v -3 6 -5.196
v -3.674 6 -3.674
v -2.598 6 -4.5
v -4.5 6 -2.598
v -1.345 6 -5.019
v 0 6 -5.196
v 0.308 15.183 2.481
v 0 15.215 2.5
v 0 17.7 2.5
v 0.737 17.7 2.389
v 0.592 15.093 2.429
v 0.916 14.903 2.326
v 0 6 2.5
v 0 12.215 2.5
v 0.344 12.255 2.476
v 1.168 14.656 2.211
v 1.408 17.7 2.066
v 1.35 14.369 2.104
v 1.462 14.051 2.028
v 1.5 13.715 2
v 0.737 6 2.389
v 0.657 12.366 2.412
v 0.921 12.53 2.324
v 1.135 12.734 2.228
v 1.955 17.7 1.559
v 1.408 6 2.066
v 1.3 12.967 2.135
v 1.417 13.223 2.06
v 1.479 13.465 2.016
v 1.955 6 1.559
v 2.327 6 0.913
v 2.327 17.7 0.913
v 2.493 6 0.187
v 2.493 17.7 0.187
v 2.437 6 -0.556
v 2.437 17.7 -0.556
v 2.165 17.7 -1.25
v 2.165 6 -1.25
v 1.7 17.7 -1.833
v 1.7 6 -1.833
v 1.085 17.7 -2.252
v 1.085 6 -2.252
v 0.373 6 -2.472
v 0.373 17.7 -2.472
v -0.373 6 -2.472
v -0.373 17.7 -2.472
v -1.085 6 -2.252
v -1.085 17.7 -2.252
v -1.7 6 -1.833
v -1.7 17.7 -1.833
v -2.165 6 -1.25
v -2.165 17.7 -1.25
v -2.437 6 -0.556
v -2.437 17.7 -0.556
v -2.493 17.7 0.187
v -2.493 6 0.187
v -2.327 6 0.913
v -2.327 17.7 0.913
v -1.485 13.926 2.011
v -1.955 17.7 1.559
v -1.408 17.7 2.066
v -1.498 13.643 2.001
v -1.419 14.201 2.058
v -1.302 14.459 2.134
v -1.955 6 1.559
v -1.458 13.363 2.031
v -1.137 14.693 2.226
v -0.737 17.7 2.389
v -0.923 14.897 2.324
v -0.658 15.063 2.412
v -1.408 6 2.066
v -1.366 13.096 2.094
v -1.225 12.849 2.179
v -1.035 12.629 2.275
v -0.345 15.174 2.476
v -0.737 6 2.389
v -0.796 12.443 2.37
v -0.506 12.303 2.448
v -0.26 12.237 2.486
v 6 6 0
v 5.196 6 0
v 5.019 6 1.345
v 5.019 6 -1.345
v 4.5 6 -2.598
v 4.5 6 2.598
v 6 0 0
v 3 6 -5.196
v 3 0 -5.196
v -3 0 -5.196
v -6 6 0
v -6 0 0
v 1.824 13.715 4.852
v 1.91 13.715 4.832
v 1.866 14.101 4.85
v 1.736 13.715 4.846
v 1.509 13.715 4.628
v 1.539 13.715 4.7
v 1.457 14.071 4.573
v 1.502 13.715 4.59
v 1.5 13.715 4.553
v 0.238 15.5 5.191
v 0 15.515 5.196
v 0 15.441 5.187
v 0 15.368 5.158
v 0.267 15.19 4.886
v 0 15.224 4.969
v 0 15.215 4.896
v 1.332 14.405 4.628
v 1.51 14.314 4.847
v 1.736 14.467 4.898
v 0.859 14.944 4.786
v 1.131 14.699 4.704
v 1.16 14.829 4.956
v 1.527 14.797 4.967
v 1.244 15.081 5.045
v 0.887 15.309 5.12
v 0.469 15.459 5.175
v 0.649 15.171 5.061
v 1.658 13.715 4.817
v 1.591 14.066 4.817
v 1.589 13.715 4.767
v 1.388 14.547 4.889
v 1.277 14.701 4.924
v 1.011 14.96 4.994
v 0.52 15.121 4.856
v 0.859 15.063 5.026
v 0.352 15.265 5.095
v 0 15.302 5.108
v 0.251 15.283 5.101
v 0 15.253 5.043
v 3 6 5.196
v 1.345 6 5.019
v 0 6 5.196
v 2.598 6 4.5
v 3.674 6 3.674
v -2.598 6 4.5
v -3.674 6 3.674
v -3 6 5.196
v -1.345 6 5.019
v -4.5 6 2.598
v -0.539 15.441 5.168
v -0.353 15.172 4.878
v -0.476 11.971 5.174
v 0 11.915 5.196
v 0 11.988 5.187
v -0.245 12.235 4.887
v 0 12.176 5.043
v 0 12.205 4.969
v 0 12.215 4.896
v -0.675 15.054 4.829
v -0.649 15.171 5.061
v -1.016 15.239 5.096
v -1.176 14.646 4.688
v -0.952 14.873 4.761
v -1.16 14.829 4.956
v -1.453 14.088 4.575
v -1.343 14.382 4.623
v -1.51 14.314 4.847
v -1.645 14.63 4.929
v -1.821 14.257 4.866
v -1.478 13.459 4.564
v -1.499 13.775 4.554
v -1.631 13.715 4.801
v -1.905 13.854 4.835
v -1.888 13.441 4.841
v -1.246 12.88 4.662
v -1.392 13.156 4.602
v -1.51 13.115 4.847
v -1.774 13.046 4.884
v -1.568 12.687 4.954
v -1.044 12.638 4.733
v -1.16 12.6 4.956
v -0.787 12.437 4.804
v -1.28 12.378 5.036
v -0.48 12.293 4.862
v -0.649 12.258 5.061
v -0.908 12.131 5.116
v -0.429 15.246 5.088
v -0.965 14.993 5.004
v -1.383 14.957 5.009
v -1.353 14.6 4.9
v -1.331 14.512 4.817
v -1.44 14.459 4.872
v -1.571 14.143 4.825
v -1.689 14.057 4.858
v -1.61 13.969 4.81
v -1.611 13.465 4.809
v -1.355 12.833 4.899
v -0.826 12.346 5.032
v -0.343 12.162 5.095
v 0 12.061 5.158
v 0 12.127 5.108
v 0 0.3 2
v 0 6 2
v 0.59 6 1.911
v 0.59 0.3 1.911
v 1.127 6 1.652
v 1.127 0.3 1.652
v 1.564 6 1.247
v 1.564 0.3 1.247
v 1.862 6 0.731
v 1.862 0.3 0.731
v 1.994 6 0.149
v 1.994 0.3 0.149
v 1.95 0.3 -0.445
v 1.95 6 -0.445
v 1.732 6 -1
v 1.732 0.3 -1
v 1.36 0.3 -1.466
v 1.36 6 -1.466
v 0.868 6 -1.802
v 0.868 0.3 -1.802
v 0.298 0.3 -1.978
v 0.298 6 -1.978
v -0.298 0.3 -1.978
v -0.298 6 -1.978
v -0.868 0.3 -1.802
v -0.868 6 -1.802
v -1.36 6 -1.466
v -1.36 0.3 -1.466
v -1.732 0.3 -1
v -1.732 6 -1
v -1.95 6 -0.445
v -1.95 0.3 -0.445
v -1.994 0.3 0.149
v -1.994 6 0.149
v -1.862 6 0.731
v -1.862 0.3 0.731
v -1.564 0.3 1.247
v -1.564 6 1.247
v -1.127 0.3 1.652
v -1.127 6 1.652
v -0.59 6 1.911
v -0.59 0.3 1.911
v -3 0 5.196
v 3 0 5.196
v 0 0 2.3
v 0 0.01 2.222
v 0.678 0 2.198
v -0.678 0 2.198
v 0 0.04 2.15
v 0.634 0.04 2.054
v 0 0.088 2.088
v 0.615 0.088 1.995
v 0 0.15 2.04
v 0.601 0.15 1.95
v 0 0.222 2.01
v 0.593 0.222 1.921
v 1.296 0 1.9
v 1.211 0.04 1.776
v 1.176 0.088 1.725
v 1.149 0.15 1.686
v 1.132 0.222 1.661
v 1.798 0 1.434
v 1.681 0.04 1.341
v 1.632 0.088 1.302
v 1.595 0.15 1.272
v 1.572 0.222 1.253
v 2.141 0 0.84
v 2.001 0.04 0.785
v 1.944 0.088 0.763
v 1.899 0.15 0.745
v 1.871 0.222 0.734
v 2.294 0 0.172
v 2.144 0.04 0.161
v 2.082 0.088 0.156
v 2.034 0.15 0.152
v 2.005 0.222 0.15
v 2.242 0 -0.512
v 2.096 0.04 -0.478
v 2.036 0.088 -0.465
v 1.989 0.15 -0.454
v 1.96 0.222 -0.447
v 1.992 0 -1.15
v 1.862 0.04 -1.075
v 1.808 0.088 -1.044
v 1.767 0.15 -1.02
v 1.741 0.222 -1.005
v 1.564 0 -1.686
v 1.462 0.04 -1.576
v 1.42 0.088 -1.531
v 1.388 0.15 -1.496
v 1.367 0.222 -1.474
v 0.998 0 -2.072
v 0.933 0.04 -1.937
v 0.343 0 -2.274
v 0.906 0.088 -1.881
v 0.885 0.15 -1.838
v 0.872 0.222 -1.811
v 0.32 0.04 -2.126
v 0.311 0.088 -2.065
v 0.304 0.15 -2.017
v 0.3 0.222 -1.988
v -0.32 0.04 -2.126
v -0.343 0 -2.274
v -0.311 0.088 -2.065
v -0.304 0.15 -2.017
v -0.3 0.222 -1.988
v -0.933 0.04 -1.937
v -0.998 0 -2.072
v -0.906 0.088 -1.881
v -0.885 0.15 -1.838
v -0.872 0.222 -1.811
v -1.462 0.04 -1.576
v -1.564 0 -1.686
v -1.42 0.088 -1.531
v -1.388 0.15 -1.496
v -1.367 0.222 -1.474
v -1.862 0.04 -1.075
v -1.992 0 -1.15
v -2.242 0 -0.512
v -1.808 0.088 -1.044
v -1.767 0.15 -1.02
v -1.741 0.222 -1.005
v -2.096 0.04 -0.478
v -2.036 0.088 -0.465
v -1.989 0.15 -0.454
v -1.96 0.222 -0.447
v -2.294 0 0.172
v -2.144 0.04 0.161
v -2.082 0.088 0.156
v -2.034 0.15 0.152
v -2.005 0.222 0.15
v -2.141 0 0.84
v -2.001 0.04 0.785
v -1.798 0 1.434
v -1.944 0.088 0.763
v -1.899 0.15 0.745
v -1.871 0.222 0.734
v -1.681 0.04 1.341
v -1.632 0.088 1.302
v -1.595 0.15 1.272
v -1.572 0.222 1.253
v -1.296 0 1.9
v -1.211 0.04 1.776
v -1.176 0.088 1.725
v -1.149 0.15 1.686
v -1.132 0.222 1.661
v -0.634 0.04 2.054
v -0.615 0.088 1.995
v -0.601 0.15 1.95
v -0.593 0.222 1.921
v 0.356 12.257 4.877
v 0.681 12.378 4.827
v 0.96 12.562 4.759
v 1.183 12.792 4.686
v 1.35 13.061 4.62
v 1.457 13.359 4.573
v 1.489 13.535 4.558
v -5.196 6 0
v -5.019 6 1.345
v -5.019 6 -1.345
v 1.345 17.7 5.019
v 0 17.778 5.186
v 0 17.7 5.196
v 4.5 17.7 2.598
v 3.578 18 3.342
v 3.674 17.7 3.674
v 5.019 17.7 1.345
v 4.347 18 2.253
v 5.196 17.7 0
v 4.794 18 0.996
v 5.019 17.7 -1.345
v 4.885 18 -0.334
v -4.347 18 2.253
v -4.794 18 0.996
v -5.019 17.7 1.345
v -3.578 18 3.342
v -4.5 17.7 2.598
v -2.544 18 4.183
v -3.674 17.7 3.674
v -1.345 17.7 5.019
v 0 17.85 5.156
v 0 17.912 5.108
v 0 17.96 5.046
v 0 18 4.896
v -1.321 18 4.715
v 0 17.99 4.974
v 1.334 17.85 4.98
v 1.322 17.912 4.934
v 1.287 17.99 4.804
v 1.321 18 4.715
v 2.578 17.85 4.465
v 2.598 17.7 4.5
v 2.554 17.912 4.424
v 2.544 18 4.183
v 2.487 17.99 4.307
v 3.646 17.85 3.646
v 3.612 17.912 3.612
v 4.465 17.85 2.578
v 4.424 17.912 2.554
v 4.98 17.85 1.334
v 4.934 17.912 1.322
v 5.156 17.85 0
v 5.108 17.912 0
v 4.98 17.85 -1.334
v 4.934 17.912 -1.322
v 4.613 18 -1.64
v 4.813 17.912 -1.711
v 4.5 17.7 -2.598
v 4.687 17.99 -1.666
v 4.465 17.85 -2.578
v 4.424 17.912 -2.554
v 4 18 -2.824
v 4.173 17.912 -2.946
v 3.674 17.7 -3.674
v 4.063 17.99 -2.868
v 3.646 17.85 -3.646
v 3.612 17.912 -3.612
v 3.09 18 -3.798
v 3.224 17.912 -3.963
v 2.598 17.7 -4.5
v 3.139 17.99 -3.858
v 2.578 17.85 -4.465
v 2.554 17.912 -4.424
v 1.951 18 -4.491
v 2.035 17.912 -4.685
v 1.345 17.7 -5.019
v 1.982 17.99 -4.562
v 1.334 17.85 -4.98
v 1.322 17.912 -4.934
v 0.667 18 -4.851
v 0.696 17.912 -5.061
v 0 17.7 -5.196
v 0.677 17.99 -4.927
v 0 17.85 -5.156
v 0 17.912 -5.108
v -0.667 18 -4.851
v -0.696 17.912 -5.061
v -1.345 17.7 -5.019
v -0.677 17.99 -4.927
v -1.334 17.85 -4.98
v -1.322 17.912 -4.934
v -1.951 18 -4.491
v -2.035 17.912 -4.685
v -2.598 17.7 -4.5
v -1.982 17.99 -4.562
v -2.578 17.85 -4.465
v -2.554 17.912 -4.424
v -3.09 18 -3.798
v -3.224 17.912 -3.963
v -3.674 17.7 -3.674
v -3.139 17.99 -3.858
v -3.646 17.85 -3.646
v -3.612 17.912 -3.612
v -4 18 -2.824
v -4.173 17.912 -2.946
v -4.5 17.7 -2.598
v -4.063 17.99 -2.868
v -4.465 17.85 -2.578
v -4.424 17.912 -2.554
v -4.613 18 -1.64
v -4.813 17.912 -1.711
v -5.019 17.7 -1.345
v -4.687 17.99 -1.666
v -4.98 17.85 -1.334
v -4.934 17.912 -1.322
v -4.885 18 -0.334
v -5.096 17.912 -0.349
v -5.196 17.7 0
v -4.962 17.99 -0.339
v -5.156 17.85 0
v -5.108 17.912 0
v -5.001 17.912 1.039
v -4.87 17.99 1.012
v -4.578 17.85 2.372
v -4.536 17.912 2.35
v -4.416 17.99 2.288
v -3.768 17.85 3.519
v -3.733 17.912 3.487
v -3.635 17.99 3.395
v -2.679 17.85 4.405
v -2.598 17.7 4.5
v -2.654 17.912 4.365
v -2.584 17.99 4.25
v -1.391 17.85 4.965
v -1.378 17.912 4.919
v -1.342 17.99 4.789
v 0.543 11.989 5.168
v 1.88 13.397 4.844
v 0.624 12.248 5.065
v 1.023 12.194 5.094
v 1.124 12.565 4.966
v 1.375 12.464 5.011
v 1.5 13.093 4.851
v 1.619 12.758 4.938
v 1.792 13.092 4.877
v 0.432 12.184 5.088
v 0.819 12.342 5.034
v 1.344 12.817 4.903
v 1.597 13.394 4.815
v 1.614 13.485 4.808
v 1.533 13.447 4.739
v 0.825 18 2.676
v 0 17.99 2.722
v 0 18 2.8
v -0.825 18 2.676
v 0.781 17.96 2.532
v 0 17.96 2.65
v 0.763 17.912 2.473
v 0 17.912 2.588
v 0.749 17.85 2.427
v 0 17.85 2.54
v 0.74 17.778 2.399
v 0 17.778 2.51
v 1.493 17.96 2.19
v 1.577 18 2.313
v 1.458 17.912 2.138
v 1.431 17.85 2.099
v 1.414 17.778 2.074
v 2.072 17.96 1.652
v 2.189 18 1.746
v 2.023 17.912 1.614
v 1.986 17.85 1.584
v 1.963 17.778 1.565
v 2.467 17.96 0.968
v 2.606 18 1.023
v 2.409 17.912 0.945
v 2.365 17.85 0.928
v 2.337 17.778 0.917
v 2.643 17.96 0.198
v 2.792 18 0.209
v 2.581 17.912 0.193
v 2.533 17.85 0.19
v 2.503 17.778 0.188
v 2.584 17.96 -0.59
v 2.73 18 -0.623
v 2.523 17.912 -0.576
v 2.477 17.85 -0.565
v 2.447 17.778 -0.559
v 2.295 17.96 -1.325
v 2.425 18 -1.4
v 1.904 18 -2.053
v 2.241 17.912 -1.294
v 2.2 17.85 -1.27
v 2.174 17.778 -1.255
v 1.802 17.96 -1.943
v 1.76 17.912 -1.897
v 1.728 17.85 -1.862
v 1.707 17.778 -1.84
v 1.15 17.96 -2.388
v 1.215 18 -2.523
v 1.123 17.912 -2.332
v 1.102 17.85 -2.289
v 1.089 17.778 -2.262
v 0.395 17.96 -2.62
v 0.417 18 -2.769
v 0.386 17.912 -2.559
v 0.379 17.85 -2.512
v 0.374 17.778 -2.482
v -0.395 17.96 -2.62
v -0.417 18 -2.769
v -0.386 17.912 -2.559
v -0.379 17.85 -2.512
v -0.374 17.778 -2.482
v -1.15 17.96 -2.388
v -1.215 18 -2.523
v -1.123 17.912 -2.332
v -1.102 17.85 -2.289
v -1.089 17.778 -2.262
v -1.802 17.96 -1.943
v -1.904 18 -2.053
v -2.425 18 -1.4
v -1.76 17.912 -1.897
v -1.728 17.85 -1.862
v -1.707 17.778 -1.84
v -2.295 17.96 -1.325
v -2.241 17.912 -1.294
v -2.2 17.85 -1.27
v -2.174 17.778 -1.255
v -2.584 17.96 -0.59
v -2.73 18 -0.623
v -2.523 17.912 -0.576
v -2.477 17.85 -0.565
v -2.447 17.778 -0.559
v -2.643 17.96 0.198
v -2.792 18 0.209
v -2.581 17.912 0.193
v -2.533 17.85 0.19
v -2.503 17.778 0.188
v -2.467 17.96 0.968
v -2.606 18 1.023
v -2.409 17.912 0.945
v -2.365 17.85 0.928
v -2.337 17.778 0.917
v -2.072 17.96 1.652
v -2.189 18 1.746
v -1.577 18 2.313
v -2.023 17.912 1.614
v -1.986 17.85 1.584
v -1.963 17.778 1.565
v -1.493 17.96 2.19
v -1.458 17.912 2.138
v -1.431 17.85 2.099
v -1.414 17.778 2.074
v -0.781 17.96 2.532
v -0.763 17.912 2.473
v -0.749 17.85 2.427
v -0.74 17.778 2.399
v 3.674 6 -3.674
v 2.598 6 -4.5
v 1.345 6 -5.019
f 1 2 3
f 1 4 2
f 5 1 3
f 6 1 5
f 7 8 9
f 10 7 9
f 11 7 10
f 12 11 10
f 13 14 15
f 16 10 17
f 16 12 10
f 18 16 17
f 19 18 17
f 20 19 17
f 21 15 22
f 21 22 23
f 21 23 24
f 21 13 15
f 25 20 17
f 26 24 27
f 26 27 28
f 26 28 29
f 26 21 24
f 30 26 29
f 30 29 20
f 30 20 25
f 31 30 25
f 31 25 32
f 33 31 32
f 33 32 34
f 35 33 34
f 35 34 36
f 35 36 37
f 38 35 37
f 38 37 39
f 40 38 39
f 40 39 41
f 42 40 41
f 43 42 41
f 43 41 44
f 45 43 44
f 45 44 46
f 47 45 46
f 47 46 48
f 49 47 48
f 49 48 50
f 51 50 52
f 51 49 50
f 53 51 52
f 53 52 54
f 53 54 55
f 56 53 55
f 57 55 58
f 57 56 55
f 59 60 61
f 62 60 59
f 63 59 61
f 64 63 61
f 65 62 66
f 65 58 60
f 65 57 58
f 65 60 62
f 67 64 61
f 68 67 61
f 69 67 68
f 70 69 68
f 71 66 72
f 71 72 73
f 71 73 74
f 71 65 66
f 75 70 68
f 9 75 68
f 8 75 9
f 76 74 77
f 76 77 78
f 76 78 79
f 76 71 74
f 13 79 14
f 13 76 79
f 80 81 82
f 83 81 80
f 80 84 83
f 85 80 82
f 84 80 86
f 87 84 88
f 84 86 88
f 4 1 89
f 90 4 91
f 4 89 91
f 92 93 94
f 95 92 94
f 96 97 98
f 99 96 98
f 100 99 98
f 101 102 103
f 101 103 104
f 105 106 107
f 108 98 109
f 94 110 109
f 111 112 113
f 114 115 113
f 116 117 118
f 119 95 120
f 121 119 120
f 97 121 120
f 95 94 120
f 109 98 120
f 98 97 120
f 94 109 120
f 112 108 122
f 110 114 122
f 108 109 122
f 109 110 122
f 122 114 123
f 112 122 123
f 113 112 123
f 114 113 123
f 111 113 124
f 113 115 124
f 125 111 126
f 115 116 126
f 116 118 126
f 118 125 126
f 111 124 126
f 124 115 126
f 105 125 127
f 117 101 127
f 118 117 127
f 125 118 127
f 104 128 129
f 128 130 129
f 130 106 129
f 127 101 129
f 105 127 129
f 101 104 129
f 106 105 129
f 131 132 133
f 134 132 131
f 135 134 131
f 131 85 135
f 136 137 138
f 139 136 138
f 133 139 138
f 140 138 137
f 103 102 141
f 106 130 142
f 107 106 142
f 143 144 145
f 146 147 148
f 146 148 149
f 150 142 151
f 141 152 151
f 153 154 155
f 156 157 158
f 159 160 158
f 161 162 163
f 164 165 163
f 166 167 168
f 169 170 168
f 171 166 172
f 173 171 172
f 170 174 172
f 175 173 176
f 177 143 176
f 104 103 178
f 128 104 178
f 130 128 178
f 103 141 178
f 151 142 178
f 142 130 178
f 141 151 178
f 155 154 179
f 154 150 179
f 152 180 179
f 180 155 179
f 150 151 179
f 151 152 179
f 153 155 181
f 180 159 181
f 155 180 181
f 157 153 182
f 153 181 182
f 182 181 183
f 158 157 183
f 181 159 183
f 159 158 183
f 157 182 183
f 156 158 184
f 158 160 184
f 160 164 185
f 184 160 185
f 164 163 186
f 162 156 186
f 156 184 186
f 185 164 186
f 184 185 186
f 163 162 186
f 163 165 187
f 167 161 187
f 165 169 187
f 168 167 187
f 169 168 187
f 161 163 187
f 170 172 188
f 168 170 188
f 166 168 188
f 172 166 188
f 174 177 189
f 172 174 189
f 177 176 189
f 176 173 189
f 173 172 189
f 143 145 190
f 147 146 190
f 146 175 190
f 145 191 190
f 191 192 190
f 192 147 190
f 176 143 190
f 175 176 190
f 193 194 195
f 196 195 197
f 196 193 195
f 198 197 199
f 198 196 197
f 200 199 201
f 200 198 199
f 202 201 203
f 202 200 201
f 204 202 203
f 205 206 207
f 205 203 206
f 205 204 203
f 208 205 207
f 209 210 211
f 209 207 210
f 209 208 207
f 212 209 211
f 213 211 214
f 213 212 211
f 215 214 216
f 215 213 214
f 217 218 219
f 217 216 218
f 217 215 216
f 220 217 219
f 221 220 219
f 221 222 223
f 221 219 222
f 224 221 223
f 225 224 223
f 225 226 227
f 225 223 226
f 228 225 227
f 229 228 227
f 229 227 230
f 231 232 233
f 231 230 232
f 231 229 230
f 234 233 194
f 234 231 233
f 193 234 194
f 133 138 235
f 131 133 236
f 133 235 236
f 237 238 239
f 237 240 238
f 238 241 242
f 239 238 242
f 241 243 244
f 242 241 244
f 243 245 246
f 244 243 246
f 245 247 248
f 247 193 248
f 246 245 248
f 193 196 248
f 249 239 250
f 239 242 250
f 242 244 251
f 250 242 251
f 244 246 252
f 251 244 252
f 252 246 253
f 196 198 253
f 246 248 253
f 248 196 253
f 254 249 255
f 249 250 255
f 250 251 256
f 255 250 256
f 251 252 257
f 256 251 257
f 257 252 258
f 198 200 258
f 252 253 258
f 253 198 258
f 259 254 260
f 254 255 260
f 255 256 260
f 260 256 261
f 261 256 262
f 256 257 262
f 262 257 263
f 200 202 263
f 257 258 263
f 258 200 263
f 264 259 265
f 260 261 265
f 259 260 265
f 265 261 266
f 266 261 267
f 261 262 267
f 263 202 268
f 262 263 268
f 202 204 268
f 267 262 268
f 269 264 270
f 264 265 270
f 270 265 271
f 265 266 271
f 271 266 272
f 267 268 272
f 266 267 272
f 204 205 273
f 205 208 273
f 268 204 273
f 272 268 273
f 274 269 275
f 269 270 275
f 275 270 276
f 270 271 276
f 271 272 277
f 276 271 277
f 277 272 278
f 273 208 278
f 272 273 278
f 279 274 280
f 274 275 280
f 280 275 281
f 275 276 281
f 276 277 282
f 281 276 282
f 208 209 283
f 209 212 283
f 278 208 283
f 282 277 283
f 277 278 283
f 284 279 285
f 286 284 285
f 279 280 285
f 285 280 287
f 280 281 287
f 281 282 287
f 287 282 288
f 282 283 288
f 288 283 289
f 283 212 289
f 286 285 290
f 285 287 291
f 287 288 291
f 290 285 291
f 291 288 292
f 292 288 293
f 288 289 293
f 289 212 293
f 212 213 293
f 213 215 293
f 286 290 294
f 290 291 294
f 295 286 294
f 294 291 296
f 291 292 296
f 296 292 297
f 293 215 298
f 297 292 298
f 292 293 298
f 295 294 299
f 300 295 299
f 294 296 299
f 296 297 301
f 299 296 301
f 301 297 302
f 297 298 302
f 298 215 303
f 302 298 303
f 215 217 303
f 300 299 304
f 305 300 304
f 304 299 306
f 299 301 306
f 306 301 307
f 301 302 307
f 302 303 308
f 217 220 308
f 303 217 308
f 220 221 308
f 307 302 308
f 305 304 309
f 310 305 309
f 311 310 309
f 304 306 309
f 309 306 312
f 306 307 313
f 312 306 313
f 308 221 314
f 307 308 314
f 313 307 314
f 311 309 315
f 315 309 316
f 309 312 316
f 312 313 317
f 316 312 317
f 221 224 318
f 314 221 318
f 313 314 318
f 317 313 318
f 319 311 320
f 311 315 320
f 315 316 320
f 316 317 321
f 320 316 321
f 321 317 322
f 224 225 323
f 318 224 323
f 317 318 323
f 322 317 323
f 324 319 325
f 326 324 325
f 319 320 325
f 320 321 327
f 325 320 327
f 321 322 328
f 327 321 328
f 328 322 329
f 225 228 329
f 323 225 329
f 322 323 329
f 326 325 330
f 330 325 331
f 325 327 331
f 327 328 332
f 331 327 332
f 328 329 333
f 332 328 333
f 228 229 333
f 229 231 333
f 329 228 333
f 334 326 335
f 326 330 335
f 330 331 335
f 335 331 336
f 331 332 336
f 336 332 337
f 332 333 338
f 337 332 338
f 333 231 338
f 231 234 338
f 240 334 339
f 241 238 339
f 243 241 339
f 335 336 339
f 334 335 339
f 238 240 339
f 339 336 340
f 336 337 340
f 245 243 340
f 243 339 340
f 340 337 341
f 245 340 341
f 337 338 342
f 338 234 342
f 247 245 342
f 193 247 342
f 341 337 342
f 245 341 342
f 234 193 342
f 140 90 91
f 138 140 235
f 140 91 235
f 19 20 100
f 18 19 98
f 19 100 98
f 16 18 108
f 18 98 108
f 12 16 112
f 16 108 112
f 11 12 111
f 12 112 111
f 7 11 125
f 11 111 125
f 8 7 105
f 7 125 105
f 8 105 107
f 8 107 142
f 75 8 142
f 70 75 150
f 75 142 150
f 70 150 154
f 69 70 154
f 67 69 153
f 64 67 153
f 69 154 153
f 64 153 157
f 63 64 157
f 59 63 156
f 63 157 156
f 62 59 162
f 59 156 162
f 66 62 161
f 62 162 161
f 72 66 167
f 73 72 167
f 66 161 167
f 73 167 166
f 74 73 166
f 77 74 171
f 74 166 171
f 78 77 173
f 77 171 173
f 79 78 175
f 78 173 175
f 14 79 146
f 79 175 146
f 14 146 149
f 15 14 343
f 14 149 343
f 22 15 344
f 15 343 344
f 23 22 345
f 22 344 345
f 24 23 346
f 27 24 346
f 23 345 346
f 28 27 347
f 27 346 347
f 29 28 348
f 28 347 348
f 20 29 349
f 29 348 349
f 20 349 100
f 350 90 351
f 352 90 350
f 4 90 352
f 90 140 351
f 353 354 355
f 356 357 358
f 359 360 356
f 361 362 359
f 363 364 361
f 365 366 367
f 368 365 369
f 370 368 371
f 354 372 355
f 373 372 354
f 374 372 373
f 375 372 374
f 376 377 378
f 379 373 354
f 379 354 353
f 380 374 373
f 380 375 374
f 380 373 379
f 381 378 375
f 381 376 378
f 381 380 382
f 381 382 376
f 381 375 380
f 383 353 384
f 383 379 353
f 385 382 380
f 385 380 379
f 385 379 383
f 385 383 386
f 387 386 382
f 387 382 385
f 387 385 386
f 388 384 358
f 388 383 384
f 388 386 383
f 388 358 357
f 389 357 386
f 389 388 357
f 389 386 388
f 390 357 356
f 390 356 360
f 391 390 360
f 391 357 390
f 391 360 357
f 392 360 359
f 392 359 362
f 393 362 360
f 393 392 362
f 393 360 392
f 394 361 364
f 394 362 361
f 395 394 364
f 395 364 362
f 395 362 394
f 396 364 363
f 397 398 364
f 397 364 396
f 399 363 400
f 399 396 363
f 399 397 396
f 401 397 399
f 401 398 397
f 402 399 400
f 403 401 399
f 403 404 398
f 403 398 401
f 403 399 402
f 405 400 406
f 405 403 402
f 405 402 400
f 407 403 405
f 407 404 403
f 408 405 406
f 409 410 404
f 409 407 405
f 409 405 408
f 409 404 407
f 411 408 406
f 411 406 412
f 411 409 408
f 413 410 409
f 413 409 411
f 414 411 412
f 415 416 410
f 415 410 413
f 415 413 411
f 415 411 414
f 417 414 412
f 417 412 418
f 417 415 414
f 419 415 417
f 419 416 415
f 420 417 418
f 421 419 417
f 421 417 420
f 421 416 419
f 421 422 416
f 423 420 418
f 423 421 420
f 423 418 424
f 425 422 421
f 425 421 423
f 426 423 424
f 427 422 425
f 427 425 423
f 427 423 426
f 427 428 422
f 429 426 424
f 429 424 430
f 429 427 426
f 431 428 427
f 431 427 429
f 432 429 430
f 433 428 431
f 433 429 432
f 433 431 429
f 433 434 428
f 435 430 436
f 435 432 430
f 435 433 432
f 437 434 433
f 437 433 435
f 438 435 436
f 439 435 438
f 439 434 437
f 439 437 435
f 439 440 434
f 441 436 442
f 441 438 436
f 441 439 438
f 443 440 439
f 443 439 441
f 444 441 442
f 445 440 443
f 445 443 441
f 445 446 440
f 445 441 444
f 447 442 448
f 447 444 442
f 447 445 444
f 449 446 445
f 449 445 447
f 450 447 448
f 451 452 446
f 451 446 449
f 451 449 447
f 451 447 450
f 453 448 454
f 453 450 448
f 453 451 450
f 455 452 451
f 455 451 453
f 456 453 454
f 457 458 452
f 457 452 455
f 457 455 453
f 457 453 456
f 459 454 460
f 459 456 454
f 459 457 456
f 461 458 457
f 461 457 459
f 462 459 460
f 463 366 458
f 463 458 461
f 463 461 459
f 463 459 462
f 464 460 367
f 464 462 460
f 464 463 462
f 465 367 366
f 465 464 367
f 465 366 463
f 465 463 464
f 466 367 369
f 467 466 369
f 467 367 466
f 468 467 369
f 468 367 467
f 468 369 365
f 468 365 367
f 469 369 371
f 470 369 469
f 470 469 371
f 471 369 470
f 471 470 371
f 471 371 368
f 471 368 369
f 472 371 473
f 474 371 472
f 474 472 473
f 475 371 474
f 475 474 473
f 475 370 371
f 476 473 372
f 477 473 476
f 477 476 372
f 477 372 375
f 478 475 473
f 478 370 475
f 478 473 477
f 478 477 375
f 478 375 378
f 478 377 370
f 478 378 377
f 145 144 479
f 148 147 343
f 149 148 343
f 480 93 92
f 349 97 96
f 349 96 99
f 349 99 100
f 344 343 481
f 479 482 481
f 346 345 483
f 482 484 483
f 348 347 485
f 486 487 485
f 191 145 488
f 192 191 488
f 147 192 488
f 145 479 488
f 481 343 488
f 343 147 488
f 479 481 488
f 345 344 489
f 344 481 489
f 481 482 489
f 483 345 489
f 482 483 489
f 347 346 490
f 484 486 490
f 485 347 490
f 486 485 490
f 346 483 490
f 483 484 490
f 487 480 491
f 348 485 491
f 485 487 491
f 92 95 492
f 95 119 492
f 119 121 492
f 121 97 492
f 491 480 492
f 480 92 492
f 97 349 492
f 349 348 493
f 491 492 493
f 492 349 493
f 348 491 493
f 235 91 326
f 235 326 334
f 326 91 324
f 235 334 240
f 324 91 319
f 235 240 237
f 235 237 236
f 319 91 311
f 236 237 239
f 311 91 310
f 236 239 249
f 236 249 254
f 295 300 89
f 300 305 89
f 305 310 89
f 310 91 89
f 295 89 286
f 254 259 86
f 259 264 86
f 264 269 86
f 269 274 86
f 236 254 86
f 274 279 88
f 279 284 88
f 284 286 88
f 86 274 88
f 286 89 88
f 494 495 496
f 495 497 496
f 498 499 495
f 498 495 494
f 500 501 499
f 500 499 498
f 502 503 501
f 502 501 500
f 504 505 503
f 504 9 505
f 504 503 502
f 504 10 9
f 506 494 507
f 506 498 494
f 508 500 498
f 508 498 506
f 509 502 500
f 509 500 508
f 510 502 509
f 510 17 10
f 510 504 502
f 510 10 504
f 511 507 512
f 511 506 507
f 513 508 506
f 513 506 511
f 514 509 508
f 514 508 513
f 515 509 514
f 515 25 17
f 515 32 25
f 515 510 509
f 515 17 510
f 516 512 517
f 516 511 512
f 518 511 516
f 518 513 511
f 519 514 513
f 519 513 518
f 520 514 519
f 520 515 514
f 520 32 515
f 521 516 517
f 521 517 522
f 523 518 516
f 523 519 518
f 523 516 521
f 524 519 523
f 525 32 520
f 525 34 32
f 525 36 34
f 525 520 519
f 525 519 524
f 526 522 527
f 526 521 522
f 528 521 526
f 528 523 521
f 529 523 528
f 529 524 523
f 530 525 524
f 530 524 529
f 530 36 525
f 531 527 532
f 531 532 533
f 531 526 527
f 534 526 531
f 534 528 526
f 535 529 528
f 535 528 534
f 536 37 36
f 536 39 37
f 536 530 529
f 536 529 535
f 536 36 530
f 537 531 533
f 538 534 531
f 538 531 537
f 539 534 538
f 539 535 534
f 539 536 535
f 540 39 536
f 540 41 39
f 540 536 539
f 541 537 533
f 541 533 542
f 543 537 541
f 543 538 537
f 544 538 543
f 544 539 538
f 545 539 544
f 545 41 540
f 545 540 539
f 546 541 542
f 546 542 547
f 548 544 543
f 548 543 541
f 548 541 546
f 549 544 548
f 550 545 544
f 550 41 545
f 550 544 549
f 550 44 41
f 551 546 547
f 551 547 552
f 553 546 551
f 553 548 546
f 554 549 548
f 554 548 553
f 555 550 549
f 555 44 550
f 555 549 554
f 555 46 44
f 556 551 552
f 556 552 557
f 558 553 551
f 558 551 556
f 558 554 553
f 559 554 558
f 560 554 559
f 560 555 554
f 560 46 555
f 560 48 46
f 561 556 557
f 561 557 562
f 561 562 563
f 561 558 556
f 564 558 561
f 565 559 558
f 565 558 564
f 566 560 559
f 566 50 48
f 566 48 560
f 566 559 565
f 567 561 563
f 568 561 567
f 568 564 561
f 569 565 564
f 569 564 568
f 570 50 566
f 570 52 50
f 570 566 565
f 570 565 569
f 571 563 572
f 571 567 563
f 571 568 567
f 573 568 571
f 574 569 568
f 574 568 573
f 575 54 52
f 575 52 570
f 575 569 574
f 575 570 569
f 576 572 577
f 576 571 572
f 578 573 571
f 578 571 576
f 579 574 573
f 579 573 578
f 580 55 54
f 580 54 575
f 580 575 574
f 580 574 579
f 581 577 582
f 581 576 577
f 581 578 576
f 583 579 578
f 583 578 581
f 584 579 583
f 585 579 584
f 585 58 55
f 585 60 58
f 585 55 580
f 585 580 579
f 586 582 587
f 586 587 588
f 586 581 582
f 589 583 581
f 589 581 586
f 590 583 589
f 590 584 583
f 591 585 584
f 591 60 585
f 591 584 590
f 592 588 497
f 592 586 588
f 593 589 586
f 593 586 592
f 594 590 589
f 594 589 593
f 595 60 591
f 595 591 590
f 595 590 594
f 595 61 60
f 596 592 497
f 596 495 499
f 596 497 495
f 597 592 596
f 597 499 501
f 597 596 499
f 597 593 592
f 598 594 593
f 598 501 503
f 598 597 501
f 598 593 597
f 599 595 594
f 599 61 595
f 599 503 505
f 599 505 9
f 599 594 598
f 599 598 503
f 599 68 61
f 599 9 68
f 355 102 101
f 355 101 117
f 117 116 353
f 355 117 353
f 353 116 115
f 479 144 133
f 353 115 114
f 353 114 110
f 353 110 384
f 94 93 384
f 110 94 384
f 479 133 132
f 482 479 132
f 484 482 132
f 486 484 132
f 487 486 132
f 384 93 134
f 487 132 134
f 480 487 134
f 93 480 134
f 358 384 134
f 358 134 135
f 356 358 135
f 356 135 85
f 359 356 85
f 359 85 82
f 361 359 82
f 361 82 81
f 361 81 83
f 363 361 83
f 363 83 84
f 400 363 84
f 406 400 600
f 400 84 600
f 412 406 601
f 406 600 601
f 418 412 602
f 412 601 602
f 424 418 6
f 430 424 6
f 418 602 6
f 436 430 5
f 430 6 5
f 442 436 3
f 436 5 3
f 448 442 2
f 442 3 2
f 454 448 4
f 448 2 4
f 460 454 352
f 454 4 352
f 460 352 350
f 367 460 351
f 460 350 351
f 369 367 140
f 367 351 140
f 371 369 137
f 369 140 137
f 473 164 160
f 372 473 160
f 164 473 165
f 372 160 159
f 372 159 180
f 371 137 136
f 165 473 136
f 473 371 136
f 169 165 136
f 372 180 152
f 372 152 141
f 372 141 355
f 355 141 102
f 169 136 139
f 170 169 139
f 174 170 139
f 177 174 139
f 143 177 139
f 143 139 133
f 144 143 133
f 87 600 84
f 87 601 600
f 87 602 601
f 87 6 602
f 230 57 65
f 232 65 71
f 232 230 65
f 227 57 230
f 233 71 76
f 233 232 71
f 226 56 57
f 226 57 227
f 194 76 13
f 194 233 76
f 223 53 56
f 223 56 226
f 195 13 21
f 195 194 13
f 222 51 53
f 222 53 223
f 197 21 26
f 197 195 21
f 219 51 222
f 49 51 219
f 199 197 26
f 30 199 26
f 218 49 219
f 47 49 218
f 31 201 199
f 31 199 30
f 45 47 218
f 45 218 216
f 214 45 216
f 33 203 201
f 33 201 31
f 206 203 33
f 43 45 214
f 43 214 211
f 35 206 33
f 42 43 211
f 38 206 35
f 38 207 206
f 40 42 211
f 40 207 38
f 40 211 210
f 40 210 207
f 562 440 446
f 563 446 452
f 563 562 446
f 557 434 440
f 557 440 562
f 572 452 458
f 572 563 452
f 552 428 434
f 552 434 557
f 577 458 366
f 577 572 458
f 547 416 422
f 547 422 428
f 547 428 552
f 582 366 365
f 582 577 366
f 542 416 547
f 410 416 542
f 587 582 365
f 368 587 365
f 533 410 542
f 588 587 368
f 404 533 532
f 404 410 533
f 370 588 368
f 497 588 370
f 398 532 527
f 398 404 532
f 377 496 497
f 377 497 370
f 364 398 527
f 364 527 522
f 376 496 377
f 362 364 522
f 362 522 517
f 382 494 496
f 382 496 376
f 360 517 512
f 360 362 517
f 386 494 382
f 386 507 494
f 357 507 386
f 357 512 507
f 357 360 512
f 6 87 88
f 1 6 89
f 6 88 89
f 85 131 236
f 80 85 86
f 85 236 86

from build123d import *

# Parameters (mm, degrees)
BOSS_EXTRUDE2_DEPTH     = 6
SKETCH3_R               = 5.196152423
SKETCH3_R_2             = 2.5
BOSS_EXTRUDE4_DEPTH     = 12
CUT_EXTRUDE2_REACH      = 21.672
SKETCH1_4_R             = 2
CUT_EXTRUDE3_REACH      = 23.633
CUT_EXTRUDE3_END_RADIUS = 2.5
SKETCH4_R               = 1.5
FILLET3_R               = 0.3


with BuildPart() as part:
    # Sketch1 → Boss-Extrude2 (new body)
    with BuildSketch(Plane(origin=(0, 0, 0), x_dir=(1, 0, 0), z_dir=(0, 1, 0))):
        Polygon((-3, 5.196152423), (-6, 0), (-3, -5.196152423), (3, -5.196152423), (6, 0), (3, 5.196152423), align=None)
    extrude(amount=BOSS_EXTRUDE2_DEPTH)

    # Sketch3 → Boss-Extrude4 (add)
    with BuildSketch(Plane(origin=(0, 6, 0), x_dir=(1, 0, 0), z_dir=(0, 1, 0))):
        with Locations(Location((0, 0, 0), (0, 0, 270))):
            Circle(SKETCH3_R)
        with Locations(Location((0, 0, 0), (0, 0, 270))):
            Circle(SKETCH3_R_2, mode=Mode.SUBTRACT)
    extrude(amount=BOSS_EXTRUDE4_DEPTH)

    # Sketch1<4> → Cut-Extrude2 (cut, up to next)
    with BuildSketch(Plane(origin=(0, 0, 0), x_dir=(1, 0, 0), z_dir=(0, 1, 0)), mode=Mode.PRIVATE) as cut_extrude2_sk1:
        with Locations(Location((0, 0, 0), (0, 0, 270))):
            Circle(SKETCH1_4_R)
    cut_extrude2_tool1 = extrude(cut_extrude2_sk1.sketch, amount=CUT_EXTRUDE2_REACH, mode=Mode.PRIVATE) & part.part
    add(cut_extrude2_tool1.solids().sort_by_distance((0, 0, 0))[0], mode=Mode.SUBTRACT)

    # Cut-Extrude3: up to this cylinder (the profile starts outside it)
    cut_extrude3_end = Plane(origin=(0, 13.714513, 0), z_dir=(0, -1, 0)) * Cylinder(CUT_EXTRUDE3_END_RADIUS, 53.266, mode=Mode.PRIVATE)
    # Sketch4 → Cut-Extrude3 (cut, up to the surface)
    with BuildSketch(Plane.XY.offset(5.196152423), mode=Mode.PRIVATE) as cut_extrude3_sk1:
        with Locations((0, 13.714512782)):
            Circle(SKETCH4_R)
    cut_extrude3_tool1 = extrude(cut_extrude3_sk1.sketch, amount=-CUT_EXTRUDE3_REACH, mode=Mode.PRIVATE) - cut_extrude3_end
    add(cut_extrude3_tool1.solids().sort_by_distance((0, 13.714513, 5.196152))[0], mode=Mode.SUBTRACT)

    # Fillet3
    fillet3_edges = [part.edges().sort_by_distance(p)[0] for p in [
        (0, 18, -5.196152423),
        (0, 18, -2.5),
        (0, 0, -2),
        (-1.5, 13.714512782, 4.974937186),
    ]]
    fillet(fillet3_edges, radius=FILLET3_R)


solid = part.part
